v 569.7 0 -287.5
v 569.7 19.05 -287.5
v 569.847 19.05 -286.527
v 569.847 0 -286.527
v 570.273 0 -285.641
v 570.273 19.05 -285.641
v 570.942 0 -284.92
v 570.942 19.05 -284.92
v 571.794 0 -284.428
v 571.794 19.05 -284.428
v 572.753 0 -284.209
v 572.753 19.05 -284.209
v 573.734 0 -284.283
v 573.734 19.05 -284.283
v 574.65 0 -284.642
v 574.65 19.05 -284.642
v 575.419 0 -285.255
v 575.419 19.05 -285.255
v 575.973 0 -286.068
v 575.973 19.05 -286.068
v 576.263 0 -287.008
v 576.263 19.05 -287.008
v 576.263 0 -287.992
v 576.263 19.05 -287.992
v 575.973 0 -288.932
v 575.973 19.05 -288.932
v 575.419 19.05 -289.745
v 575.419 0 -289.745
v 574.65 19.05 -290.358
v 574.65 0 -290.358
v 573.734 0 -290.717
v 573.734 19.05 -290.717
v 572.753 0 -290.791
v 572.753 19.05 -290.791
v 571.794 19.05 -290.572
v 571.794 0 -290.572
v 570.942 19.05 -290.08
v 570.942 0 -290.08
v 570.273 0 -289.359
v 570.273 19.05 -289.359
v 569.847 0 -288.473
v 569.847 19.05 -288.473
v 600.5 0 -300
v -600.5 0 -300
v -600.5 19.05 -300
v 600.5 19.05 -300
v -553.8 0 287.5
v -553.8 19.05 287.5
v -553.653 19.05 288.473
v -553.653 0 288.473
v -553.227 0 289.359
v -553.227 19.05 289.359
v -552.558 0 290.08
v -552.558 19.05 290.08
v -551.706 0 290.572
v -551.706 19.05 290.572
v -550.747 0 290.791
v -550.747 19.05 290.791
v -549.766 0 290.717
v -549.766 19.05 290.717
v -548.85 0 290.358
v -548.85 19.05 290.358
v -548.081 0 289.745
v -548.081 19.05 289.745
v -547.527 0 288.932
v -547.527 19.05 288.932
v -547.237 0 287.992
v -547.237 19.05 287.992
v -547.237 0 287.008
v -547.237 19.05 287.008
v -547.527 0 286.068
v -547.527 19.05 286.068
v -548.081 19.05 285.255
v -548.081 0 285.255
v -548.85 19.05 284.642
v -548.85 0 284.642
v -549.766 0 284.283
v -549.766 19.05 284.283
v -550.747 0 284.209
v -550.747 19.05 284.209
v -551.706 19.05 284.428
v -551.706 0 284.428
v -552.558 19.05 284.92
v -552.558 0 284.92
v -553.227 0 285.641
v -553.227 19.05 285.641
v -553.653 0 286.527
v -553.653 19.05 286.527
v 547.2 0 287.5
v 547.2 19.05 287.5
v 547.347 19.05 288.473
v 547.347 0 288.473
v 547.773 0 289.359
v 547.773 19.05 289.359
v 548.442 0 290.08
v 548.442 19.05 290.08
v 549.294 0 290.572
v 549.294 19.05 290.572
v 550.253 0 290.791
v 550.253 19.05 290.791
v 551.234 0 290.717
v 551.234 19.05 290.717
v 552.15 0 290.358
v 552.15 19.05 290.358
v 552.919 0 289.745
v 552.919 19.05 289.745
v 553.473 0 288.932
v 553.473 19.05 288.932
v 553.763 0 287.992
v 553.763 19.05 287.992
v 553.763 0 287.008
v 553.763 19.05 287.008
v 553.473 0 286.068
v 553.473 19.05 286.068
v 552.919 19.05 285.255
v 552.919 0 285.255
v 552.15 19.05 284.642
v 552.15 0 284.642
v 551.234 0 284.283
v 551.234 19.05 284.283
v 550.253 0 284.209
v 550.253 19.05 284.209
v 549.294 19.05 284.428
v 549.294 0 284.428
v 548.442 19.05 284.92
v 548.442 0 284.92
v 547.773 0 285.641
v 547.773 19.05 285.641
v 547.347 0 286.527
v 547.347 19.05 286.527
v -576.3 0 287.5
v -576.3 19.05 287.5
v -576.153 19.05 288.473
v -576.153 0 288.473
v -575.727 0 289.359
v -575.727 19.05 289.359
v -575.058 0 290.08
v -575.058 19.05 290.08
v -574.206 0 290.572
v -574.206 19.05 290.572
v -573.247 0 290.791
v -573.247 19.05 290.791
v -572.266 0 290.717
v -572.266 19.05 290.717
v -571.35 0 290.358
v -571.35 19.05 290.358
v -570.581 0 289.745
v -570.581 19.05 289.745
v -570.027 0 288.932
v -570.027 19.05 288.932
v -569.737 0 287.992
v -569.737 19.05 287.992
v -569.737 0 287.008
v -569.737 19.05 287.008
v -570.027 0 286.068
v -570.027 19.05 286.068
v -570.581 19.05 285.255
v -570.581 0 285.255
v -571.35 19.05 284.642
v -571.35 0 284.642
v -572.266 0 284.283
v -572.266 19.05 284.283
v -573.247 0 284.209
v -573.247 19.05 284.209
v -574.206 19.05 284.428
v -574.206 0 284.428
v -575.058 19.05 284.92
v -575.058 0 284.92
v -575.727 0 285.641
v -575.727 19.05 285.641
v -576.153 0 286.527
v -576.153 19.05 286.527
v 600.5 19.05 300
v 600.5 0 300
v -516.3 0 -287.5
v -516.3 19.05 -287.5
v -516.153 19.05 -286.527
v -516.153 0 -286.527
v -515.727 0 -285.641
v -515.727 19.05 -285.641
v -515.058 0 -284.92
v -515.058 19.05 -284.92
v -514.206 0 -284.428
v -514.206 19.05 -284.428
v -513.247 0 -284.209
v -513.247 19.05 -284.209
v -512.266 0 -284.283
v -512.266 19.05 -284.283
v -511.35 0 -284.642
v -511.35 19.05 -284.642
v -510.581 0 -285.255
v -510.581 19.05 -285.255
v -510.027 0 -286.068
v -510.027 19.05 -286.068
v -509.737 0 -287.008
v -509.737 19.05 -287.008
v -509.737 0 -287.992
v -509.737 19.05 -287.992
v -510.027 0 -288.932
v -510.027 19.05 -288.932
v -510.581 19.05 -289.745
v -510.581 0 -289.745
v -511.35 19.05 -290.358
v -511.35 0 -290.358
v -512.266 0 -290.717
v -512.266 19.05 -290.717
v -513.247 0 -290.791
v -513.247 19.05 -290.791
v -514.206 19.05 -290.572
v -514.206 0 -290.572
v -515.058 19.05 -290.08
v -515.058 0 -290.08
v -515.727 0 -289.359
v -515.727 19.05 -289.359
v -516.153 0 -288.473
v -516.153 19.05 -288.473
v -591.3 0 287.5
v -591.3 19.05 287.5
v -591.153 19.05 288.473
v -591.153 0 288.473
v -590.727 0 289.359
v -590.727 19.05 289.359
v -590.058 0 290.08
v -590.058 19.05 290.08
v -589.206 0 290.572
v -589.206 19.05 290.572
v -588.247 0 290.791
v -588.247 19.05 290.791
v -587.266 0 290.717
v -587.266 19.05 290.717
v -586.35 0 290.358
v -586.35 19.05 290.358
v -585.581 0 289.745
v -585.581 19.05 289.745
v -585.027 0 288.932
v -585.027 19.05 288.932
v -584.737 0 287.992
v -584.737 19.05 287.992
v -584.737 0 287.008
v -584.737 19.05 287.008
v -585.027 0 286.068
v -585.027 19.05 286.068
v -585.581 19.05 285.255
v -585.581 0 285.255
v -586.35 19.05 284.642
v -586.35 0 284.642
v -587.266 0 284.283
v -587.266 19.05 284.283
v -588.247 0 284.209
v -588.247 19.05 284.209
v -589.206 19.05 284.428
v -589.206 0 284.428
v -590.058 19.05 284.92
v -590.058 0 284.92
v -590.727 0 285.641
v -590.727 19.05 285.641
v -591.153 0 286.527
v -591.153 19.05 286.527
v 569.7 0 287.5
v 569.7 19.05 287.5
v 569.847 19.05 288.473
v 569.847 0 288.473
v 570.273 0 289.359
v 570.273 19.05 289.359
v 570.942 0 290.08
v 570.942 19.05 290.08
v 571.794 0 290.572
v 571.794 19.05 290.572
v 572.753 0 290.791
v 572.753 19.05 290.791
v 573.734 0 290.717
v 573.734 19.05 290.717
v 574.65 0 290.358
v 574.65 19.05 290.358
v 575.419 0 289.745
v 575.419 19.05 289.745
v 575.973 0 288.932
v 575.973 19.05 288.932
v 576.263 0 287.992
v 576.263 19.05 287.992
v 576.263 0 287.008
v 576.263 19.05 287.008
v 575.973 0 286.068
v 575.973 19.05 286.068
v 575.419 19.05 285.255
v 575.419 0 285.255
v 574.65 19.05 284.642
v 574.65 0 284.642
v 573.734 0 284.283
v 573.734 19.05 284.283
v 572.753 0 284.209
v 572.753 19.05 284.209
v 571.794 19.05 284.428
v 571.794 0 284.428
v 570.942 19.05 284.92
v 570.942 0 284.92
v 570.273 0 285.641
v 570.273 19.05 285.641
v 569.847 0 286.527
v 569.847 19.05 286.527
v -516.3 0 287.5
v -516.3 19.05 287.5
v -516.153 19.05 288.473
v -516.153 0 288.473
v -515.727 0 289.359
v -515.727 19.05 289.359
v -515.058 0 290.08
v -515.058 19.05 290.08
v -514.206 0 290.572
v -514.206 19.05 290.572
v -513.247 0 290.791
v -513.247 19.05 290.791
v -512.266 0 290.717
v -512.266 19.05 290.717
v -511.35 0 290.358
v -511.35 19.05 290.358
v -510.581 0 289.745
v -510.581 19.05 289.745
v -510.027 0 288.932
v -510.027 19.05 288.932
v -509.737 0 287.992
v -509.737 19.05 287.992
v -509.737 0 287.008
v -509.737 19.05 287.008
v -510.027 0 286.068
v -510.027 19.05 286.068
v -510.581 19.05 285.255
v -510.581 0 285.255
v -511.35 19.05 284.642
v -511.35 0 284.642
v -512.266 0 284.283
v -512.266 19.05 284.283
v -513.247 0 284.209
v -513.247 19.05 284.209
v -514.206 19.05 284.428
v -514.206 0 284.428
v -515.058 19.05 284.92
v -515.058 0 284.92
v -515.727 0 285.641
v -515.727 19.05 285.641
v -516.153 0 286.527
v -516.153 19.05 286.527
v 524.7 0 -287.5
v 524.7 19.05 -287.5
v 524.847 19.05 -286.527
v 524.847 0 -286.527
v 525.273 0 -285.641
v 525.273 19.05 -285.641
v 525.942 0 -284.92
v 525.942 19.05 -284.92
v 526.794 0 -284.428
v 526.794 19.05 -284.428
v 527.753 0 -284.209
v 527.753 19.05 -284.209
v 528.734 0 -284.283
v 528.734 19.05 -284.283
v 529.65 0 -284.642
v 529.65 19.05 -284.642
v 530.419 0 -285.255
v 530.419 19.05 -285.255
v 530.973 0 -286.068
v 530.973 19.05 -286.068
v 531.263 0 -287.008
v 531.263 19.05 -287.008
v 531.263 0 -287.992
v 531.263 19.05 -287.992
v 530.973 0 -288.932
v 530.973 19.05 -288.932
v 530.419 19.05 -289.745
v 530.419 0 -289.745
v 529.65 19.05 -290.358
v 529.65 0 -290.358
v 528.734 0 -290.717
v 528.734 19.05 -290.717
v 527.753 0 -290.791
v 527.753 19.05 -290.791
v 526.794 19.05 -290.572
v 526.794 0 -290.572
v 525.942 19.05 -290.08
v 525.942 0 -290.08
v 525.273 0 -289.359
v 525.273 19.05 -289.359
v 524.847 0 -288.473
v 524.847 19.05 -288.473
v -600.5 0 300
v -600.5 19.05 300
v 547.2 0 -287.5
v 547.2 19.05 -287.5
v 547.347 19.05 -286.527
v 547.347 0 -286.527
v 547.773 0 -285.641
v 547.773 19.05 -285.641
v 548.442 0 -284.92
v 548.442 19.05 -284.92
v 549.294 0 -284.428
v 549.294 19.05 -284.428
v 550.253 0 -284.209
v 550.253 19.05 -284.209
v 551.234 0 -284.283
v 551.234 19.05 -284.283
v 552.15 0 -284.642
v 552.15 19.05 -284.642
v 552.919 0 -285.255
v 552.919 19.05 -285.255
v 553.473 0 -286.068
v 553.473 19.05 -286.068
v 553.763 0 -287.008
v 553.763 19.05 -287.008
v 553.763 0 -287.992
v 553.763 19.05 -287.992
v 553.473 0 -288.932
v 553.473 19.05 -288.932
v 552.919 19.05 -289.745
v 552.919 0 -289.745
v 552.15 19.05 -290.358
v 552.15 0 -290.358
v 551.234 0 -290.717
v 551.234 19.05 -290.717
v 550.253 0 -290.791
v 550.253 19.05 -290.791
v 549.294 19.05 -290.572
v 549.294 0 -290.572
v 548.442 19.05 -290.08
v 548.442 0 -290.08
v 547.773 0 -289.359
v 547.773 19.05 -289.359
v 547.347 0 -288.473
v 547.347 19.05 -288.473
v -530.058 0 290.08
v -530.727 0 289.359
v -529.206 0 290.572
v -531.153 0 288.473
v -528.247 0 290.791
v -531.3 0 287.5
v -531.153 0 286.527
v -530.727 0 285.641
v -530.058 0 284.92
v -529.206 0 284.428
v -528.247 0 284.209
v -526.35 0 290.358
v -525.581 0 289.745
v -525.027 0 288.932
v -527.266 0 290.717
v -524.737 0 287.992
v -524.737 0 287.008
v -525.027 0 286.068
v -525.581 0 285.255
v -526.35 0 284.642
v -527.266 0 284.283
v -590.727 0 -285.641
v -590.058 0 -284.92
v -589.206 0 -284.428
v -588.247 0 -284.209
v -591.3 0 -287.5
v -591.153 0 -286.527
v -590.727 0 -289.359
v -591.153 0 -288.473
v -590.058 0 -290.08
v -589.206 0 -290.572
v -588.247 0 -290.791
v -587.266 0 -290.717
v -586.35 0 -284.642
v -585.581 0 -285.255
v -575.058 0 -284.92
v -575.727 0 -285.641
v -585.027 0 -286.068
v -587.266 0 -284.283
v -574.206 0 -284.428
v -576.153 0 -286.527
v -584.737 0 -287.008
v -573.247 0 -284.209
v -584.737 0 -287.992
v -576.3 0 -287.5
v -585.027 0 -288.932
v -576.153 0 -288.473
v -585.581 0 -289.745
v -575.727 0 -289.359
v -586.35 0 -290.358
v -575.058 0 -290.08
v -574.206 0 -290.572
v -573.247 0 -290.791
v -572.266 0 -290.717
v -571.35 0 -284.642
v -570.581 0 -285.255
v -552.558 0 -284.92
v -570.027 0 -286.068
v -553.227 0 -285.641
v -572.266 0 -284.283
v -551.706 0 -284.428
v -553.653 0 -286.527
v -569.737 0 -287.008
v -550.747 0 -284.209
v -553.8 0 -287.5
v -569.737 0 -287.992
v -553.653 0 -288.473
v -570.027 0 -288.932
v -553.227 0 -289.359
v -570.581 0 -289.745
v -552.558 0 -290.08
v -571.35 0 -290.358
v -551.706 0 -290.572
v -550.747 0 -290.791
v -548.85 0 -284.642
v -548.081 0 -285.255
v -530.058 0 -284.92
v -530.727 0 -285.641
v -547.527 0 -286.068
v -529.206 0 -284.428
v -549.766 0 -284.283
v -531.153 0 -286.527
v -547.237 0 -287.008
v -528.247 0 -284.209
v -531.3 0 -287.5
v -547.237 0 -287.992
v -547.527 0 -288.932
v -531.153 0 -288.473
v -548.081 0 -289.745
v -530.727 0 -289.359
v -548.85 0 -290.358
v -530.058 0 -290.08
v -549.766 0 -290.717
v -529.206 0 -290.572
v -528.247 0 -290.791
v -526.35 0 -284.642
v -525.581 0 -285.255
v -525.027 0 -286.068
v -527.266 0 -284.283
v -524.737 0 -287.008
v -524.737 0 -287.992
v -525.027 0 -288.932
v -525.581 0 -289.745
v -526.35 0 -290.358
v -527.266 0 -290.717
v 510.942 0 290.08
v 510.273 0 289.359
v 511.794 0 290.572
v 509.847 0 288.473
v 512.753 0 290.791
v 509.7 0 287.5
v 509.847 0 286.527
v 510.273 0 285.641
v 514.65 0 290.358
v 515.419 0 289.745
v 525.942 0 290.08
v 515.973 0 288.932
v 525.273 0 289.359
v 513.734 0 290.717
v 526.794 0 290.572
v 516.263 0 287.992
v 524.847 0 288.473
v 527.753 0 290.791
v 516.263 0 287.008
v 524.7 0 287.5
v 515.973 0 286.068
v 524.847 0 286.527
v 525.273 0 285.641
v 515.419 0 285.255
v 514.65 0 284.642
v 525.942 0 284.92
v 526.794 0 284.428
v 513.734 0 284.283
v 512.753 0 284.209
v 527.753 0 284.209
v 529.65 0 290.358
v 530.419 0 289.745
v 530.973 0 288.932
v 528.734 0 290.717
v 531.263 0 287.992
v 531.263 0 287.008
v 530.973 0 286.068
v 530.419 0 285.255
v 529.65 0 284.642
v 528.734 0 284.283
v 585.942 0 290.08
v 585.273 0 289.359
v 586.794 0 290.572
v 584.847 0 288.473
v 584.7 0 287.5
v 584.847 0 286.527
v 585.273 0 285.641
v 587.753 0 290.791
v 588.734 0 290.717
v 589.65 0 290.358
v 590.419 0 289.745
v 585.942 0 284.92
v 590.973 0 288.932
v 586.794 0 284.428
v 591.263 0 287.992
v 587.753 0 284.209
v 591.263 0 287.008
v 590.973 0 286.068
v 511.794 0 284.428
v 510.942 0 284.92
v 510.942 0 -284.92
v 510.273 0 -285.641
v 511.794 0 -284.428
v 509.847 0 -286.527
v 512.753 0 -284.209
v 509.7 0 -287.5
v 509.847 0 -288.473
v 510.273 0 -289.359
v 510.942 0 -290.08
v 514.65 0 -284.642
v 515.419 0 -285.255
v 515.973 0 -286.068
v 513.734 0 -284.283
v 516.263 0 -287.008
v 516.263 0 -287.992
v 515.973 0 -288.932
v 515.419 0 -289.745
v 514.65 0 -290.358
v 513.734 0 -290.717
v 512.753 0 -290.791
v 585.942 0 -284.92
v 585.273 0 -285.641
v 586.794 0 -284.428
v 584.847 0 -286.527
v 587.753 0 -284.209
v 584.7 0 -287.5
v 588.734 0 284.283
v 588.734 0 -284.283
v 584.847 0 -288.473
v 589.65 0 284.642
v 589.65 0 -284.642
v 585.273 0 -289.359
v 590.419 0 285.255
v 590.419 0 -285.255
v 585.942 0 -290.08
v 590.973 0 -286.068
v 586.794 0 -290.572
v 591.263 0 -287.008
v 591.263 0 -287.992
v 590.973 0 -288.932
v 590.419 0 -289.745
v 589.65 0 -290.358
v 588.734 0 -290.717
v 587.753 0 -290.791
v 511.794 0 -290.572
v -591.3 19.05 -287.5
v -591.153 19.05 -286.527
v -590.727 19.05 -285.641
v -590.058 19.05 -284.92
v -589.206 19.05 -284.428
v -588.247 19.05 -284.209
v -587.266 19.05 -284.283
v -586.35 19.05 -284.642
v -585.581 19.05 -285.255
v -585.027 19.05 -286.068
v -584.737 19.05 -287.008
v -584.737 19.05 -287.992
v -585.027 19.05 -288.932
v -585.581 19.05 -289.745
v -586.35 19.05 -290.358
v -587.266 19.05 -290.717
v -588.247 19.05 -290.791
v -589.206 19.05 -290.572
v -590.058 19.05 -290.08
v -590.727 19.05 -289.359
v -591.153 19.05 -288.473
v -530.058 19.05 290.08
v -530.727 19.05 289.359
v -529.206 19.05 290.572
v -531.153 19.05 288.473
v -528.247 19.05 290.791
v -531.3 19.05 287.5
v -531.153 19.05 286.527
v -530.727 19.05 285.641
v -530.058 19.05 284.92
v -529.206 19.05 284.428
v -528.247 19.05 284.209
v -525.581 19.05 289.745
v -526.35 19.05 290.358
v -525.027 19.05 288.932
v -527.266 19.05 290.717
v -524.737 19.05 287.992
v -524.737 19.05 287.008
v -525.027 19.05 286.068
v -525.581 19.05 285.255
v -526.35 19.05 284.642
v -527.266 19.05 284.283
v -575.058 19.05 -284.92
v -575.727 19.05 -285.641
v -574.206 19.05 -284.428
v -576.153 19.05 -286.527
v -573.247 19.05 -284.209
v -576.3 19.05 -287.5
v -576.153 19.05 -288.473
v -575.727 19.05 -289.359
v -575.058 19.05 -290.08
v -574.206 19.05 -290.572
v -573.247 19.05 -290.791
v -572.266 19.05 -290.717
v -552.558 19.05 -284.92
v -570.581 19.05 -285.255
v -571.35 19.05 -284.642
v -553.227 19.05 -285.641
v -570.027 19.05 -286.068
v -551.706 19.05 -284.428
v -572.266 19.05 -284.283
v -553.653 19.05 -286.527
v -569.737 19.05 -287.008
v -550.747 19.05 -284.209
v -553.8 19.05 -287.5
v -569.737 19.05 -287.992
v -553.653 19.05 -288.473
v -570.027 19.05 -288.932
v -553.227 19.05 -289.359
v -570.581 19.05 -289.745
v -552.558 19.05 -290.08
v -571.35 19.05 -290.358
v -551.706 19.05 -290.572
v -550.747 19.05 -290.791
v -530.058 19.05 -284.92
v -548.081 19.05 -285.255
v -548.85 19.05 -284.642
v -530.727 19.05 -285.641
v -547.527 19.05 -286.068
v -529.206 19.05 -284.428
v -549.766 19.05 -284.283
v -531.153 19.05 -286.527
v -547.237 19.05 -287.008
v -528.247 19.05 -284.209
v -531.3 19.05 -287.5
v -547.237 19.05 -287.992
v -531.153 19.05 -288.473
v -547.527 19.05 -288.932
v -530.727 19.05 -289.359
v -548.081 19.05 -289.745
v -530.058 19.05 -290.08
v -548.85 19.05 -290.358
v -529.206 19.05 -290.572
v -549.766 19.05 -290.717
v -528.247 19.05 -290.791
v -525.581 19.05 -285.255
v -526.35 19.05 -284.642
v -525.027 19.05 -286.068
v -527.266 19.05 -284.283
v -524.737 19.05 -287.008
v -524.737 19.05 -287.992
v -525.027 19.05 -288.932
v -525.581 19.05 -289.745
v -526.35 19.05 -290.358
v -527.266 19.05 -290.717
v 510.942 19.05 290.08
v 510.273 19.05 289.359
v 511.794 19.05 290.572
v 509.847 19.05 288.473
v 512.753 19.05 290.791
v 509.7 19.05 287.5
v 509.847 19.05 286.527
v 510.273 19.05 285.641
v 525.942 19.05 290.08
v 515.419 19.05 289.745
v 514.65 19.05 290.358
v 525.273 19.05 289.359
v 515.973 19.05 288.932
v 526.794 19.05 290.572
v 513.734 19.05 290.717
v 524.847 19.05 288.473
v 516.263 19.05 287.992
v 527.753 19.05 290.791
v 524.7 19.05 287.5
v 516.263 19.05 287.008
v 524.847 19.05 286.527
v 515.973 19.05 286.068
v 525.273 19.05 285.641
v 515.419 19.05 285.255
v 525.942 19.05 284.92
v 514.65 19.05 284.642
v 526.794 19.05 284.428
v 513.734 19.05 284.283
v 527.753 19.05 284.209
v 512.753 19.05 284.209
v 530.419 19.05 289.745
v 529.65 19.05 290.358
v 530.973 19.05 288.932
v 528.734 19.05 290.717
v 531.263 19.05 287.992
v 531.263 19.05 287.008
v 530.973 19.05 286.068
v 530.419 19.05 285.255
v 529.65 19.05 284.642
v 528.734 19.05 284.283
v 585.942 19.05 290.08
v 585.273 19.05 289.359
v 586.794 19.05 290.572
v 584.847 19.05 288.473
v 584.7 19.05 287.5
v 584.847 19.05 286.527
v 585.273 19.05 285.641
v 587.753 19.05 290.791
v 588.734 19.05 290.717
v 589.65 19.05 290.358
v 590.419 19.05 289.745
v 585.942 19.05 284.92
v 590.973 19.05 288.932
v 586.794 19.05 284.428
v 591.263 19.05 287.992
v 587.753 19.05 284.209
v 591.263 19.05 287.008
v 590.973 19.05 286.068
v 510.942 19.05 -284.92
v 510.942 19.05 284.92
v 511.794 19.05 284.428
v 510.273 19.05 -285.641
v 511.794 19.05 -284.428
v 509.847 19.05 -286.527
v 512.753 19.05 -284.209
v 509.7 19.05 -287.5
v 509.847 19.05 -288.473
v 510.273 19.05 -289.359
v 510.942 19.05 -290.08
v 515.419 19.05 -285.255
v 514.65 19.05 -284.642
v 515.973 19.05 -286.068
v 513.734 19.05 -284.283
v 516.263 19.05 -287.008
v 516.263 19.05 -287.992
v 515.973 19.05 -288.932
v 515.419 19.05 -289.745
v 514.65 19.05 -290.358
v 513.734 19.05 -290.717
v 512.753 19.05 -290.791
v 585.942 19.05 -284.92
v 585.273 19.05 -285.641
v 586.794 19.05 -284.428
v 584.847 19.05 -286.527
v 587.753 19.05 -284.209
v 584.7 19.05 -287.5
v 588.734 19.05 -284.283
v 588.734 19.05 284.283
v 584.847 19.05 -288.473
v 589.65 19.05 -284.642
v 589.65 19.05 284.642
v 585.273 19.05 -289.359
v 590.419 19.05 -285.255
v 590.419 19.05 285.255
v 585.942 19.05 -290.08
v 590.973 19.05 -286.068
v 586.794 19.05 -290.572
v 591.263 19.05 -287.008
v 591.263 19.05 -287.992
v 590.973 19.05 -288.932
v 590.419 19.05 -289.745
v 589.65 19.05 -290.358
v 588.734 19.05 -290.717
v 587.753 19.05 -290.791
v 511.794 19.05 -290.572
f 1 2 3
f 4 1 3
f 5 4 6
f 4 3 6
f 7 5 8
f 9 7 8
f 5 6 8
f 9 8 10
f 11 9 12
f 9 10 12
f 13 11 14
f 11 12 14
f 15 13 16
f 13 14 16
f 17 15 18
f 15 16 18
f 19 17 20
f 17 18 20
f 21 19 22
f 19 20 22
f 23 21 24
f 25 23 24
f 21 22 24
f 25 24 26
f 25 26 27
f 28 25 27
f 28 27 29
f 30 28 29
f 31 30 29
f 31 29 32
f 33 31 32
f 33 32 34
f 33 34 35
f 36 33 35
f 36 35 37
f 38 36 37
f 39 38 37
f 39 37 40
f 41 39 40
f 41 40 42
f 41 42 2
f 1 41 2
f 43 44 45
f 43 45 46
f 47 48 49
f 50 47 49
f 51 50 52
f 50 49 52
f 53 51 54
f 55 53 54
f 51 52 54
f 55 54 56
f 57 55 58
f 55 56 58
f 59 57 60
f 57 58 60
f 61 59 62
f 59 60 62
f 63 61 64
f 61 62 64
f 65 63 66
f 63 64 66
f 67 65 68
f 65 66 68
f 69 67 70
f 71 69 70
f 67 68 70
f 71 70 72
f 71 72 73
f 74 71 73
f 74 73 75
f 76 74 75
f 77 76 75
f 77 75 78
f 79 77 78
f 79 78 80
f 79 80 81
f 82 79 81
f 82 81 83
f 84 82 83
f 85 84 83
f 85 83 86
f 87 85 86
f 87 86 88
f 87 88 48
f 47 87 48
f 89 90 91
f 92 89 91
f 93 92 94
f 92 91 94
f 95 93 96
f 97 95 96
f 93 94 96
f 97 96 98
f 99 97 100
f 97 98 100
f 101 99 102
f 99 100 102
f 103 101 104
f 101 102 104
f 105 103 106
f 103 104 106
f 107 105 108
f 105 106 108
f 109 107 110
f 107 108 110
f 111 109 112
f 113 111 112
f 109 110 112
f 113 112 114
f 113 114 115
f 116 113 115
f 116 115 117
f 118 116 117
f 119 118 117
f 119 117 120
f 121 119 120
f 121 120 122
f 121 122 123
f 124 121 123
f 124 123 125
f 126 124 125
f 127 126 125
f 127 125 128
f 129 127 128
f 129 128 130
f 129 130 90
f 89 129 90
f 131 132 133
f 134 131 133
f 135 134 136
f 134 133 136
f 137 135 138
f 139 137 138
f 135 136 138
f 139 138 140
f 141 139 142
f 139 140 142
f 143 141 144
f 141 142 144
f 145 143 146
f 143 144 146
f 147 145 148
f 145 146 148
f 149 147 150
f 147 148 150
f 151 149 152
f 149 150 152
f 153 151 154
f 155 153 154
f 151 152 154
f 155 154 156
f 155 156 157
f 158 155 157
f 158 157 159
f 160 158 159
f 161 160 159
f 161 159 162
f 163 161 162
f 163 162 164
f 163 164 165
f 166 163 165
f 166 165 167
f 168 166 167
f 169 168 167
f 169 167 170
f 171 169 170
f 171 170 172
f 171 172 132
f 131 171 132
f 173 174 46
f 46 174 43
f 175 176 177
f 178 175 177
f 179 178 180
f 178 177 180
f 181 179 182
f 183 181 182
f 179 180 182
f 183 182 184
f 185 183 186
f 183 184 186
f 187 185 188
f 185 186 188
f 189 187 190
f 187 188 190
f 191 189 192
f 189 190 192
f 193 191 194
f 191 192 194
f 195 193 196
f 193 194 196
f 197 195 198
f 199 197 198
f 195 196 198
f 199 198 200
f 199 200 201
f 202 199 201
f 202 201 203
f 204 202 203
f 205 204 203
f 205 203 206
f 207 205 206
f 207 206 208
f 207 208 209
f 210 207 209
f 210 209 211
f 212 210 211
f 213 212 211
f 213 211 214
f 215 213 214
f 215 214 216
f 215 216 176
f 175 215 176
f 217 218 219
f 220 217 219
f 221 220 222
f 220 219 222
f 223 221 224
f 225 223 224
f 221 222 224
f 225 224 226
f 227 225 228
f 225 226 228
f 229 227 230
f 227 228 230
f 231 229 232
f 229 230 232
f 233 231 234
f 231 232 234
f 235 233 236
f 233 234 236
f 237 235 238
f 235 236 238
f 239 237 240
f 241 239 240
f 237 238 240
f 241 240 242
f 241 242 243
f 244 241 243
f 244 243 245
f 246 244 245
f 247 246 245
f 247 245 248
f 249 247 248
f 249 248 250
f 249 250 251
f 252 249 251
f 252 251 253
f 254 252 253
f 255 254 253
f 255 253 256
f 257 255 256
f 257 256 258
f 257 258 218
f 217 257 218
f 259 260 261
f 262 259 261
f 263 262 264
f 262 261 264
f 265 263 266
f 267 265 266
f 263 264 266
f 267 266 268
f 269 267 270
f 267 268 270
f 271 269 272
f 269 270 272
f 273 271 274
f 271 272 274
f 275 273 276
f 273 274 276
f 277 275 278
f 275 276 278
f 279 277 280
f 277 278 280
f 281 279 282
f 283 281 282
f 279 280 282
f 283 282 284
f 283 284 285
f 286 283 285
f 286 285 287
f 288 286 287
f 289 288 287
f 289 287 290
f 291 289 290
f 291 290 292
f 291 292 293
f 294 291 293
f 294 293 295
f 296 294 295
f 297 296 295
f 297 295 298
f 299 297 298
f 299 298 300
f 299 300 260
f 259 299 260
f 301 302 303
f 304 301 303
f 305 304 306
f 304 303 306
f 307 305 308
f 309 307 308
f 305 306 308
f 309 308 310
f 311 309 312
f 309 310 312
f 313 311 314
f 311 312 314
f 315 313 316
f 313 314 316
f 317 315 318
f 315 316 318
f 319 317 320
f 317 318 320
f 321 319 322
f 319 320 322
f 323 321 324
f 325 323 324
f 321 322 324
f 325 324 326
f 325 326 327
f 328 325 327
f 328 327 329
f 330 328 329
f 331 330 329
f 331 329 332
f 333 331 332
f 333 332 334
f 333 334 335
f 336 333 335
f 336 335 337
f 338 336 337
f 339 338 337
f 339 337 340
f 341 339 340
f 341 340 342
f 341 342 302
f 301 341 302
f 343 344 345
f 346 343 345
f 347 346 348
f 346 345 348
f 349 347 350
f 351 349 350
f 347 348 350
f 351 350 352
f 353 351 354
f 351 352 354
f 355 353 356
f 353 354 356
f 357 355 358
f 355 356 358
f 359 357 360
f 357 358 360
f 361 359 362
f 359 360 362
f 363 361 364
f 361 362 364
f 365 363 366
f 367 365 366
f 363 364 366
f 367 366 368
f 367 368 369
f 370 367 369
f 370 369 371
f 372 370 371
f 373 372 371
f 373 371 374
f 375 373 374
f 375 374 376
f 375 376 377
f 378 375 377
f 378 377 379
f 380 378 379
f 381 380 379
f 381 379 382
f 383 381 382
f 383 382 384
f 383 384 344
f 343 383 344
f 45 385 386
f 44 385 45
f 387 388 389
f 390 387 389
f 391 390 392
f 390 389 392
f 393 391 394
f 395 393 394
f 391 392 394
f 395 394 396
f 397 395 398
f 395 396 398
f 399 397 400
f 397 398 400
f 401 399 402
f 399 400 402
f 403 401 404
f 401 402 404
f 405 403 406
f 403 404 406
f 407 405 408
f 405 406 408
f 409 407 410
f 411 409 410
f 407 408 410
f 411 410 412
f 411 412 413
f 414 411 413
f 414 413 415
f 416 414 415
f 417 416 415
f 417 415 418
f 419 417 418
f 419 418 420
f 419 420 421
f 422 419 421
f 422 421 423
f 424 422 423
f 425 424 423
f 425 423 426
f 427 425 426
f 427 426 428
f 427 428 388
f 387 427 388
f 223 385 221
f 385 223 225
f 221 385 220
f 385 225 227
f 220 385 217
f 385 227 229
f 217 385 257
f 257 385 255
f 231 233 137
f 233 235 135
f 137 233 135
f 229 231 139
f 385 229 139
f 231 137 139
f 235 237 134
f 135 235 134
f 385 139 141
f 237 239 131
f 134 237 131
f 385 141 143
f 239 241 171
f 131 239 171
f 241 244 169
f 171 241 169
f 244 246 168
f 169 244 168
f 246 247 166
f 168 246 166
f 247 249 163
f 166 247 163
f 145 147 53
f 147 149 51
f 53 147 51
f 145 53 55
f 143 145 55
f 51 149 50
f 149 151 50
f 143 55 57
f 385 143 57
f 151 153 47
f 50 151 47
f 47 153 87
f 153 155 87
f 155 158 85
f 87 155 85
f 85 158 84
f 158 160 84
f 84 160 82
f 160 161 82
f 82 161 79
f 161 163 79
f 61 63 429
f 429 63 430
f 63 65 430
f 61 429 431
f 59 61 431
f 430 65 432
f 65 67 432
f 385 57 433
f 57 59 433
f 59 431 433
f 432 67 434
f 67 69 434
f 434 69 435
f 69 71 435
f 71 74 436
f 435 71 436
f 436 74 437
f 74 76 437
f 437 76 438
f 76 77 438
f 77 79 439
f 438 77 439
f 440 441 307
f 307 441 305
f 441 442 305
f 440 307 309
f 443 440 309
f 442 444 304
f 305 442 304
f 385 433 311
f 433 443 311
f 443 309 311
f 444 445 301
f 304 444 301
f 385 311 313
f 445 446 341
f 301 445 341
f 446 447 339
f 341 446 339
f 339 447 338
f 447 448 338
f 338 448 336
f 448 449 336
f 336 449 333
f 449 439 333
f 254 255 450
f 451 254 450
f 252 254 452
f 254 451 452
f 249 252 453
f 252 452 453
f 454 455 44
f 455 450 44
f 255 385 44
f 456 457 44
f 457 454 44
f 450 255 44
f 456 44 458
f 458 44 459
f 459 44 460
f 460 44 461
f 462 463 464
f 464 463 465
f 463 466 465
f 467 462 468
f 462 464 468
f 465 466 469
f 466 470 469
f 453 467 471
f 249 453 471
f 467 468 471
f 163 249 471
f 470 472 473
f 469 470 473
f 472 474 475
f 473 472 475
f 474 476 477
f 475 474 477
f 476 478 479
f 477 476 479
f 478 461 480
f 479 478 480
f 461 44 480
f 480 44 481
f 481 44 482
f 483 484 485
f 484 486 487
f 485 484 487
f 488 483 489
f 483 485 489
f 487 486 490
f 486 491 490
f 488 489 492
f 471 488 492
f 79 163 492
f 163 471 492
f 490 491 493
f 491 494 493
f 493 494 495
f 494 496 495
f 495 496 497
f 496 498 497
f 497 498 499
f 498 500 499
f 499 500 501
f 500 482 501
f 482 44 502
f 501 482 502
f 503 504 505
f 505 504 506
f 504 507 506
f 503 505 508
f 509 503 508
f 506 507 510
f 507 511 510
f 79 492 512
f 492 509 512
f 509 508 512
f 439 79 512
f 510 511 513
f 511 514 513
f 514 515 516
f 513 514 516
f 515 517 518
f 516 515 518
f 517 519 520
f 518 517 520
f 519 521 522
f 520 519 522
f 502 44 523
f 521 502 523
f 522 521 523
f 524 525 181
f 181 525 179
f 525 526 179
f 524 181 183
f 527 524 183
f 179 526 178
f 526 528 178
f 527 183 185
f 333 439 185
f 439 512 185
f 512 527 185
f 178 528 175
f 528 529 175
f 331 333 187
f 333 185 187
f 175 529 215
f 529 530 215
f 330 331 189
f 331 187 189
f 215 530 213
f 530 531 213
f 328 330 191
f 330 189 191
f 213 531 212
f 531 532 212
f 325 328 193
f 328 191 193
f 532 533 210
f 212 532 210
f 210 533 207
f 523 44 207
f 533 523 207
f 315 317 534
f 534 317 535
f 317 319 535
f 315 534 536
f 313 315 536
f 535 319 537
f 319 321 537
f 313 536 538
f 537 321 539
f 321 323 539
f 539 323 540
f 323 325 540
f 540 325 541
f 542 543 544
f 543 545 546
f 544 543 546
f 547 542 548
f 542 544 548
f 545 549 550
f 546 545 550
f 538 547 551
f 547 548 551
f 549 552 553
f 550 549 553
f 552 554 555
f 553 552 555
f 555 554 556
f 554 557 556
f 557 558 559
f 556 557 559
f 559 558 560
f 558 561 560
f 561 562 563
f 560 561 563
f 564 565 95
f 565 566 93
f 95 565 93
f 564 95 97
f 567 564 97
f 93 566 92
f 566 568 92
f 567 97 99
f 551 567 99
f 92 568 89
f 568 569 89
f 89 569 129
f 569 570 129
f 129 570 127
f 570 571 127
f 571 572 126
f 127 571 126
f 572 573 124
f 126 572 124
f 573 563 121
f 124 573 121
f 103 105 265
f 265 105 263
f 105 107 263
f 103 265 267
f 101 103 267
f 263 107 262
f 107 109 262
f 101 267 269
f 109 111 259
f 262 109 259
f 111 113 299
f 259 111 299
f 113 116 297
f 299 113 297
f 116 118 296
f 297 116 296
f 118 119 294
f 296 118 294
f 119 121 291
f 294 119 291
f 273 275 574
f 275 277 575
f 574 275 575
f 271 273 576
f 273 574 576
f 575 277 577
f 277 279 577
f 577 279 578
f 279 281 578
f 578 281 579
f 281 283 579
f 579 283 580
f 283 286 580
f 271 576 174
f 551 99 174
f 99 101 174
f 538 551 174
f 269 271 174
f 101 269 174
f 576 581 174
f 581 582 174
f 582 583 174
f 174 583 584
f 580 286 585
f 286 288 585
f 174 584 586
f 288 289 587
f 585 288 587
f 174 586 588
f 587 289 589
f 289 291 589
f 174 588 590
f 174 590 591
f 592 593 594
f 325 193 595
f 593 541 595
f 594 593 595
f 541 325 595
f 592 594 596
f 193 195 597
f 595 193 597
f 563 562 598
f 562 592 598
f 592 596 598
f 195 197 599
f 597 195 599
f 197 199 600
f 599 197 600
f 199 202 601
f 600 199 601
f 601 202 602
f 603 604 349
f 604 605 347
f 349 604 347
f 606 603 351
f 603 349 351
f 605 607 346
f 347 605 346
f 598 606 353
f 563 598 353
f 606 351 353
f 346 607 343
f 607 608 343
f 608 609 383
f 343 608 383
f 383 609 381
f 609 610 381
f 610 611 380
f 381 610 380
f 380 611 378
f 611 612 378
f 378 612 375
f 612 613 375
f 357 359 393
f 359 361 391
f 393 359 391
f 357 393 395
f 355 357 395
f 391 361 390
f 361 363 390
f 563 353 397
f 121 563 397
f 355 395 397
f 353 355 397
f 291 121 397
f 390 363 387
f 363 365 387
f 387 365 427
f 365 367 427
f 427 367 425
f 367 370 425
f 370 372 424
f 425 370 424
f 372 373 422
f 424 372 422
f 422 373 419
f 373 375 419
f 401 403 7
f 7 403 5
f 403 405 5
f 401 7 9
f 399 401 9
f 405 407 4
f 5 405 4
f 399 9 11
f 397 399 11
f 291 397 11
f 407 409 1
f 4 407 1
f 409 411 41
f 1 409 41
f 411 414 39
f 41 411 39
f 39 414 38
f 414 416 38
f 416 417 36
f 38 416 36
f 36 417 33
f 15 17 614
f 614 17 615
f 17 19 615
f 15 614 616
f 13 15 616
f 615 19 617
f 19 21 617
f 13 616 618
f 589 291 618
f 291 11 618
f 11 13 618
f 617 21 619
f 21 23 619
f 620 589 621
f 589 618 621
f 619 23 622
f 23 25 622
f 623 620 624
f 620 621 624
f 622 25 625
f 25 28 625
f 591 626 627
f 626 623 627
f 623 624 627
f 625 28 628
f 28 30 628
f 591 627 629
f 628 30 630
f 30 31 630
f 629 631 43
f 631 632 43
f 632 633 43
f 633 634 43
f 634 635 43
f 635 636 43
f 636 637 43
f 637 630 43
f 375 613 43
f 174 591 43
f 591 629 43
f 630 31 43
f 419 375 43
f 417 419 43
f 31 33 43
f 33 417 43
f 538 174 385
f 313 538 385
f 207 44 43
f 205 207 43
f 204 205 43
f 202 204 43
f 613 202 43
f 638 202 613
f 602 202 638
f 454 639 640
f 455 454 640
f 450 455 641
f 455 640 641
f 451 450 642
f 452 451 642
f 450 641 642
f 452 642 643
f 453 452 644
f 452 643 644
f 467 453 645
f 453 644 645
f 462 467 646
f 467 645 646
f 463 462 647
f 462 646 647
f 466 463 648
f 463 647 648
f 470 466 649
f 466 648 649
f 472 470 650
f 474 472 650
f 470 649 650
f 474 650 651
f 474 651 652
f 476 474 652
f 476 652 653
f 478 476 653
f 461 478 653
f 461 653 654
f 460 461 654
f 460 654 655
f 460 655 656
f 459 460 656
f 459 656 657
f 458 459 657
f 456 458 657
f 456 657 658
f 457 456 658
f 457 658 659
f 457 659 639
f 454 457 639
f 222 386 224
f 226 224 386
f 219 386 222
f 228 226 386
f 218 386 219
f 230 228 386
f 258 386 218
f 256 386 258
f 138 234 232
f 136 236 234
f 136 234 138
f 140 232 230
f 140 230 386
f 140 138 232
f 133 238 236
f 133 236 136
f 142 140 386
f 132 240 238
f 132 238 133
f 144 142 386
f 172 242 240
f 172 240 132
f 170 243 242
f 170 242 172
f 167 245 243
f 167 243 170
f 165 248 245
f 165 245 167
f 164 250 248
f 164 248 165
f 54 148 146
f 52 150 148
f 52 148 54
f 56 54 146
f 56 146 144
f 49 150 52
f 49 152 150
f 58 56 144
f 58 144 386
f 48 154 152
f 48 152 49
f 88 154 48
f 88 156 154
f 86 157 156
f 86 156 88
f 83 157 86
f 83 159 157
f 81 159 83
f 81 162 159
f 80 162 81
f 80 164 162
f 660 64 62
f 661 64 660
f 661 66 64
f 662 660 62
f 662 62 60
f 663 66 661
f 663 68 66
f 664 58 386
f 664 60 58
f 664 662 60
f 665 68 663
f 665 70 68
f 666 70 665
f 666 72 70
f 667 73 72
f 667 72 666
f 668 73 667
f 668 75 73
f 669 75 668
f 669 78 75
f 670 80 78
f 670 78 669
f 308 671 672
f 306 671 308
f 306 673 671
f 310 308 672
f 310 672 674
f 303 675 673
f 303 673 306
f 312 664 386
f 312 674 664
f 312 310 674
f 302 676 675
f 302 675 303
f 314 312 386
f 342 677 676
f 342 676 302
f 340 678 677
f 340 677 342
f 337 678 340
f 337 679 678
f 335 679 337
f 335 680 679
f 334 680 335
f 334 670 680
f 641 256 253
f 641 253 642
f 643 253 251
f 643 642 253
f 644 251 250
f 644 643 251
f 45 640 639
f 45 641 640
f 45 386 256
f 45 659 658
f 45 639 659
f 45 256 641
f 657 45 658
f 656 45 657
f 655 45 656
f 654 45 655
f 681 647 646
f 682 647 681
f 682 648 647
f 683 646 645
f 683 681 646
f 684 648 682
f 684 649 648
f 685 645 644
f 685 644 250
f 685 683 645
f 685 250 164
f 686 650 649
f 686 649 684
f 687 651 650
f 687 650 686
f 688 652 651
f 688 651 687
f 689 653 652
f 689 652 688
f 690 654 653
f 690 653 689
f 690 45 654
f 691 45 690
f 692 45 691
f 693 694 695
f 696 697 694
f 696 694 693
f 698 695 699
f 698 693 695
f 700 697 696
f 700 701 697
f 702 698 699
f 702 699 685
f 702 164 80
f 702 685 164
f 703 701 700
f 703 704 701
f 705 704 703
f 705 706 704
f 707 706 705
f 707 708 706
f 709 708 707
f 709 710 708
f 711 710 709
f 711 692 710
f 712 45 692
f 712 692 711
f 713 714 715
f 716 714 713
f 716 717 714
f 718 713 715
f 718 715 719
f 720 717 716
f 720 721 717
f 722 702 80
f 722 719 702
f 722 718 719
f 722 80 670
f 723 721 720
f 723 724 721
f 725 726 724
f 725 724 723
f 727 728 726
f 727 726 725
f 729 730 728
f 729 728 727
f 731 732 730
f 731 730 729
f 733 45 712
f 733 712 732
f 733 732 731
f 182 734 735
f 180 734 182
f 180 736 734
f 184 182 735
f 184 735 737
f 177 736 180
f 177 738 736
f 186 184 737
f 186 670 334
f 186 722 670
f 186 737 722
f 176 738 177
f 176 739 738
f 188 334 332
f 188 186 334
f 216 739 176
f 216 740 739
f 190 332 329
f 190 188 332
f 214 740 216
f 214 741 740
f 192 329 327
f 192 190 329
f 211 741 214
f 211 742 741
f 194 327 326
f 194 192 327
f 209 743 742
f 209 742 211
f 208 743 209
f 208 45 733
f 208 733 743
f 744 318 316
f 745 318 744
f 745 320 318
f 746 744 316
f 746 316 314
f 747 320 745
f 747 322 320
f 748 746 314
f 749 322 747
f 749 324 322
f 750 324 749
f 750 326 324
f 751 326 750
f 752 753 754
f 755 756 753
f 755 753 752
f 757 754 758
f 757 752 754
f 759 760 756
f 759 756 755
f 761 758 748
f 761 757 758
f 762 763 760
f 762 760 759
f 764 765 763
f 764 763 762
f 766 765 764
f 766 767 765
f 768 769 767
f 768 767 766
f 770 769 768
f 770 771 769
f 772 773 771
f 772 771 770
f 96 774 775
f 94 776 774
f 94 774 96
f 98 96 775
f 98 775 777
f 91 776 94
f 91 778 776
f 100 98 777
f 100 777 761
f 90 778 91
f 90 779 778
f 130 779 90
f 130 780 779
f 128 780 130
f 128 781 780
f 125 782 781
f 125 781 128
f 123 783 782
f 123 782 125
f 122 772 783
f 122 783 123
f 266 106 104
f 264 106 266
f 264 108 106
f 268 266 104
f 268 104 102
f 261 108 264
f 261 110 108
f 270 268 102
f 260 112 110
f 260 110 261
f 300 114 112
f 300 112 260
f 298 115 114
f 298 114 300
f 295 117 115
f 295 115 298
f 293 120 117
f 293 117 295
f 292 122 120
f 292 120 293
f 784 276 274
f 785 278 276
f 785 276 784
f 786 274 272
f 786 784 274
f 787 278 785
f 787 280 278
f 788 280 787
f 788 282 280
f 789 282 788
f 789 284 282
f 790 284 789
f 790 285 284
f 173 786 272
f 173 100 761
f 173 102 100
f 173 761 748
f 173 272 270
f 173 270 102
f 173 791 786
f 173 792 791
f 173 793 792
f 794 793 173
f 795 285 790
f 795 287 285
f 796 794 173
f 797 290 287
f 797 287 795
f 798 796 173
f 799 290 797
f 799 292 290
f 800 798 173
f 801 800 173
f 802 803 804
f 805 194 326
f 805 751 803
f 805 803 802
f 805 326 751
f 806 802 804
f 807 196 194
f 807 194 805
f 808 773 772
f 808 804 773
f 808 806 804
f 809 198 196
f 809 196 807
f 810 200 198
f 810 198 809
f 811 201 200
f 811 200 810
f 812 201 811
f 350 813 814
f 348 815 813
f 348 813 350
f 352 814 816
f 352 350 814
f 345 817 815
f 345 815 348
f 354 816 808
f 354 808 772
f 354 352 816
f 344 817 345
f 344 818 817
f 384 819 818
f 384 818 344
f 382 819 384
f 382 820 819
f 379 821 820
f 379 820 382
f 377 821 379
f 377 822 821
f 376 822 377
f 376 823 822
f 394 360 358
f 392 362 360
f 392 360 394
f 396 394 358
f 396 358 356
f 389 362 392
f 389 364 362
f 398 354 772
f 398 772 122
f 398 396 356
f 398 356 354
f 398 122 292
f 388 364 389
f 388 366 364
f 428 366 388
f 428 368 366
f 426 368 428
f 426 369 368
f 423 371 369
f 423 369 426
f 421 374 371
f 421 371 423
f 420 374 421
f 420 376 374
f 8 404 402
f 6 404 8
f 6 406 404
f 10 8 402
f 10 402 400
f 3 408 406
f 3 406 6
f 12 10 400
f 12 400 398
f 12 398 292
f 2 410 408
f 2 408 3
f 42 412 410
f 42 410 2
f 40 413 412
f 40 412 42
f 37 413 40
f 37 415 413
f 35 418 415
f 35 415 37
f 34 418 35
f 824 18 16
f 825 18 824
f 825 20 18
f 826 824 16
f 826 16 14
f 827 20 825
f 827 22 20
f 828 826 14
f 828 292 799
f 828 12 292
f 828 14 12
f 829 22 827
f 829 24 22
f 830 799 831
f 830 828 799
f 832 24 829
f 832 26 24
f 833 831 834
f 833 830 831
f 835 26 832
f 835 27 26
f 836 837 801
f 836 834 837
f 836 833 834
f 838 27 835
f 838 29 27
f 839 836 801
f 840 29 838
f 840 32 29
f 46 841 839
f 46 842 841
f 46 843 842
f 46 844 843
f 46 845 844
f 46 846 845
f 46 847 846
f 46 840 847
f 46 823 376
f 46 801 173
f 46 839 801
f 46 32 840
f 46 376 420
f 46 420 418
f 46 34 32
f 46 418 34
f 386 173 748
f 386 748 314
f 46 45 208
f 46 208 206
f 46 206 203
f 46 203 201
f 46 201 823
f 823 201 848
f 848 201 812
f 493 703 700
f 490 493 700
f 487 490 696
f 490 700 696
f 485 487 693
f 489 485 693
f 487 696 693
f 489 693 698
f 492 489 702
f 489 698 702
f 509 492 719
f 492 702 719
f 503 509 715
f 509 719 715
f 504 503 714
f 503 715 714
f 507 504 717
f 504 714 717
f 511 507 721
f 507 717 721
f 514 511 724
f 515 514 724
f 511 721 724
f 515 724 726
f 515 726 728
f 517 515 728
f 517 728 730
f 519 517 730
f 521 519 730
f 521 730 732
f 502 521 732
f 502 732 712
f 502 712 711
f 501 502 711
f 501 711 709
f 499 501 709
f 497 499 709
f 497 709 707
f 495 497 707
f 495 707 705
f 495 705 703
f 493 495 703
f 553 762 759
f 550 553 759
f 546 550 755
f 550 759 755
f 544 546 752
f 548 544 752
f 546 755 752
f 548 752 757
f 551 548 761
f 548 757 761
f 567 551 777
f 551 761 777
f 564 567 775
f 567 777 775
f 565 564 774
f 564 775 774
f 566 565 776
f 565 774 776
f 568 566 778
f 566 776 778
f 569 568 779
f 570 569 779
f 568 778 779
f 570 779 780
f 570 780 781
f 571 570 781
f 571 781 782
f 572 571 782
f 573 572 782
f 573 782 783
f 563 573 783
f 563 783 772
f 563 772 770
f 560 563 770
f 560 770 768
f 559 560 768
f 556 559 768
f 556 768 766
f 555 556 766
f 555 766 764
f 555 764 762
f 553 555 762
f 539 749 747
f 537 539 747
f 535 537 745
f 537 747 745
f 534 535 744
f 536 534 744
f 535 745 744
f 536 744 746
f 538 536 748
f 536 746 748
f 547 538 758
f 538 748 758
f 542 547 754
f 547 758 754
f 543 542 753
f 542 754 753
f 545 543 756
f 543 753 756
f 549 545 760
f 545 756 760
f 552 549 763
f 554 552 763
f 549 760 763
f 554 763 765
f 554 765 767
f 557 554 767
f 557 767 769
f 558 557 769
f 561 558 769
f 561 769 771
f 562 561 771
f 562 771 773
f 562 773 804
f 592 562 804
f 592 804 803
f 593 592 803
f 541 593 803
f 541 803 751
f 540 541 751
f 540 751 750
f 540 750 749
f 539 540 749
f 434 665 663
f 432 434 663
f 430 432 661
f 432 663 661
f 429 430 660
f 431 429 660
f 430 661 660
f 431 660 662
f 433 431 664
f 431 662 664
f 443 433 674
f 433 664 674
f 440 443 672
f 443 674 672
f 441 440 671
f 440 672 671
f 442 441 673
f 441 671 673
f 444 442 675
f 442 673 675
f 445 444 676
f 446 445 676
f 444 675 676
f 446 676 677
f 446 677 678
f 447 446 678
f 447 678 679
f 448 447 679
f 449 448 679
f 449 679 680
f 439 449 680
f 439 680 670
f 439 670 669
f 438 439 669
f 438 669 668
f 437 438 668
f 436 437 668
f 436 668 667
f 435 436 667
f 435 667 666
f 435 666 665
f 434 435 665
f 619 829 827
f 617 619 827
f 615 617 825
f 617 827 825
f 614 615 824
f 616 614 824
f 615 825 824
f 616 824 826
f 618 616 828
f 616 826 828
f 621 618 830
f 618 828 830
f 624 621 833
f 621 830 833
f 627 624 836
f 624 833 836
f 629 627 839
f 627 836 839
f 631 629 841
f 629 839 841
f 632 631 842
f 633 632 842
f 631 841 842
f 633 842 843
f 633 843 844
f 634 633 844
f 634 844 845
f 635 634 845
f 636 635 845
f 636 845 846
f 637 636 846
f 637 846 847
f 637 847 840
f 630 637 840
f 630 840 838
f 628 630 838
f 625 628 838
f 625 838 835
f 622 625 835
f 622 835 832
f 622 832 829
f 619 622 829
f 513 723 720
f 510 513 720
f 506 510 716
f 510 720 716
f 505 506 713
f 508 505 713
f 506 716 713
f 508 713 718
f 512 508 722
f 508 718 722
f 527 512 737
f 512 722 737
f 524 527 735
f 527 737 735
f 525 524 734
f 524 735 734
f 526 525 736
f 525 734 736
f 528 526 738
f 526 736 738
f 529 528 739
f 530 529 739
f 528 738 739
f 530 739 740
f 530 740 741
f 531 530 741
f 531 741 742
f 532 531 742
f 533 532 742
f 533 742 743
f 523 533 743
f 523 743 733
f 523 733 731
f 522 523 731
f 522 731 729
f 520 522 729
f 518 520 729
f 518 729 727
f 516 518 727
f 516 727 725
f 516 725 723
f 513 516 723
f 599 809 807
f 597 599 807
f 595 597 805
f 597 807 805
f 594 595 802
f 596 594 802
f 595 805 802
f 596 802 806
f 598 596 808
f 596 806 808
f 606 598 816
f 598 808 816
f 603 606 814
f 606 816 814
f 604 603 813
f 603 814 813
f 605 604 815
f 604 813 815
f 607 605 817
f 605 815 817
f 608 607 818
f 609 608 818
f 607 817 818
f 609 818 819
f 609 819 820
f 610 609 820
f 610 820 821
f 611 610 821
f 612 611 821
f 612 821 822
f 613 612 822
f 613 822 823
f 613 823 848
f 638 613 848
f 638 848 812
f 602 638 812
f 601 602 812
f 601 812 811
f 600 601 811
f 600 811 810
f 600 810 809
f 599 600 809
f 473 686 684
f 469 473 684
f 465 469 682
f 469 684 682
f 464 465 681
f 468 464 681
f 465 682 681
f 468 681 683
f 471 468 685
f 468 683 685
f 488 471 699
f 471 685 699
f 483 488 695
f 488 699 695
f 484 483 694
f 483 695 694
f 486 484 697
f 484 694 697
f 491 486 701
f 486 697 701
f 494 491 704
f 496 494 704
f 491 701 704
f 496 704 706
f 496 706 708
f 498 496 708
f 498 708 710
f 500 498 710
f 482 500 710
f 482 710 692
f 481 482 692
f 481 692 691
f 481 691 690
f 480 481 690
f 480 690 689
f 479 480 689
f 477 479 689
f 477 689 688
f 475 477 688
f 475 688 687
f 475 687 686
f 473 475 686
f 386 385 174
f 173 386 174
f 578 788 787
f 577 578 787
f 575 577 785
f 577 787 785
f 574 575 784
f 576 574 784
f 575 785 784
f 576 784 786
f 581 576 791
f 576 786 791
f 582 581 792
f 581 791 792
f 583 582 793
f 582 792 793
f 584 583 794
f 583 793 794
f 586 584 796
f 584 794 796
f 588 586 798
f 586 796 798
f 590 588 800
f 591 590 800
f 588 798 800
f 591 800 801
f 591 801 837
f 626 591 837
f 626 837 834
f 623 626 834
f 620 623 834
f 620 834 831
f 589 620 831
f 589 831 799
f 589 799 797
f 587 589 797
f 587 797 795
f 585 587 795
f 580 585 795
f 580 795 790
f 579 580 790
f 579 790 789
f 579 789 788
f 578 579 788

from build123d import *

# Parameters (mm, degrees)
SKETCH1_W            = 1201
SKETCH1_H            = 600
BOSS_EXTRUDE1_DEPTH  = 19.05
M6_CLEARANCE_HOLE1_D = 6.6


with BuildPart() as part:
    # Sketch1 → Boss-Extrude1 (new body)
    with BuildSketch(Plane(origin=(0, 0, 0), x_dir=(1, 0, 0), z_dir=(0, 1, 0))):
        Rectangle(SKETCH1_W, SKETCH1_H)
    extrude(amount=BOSS_EXTRUDE1_DEPTH)

    # M6 Clearance Hole1 (through all)
    with Locations(Plane.XZ):
        with Locations((-588, 287.5), (-573, 287.5), (-550.5, 287.5), (-528, 287.5), (-513, 287.5), (-588, -287.5), (-573, -287.5), (-550.5, -287.5), (-528, -287.5), (-513, -287.5), (513, -287.5), (528, -287.5), (550.5, -287.5), (573, -287.5), (588, -287.5), (513, 287.5), (528, 287.5), (550.5, 287.5), (573, 287.5), (588, 287.5)):
            Hole(M6_CLEARANCE_HOLE1_D / 2)


solid = part.part
